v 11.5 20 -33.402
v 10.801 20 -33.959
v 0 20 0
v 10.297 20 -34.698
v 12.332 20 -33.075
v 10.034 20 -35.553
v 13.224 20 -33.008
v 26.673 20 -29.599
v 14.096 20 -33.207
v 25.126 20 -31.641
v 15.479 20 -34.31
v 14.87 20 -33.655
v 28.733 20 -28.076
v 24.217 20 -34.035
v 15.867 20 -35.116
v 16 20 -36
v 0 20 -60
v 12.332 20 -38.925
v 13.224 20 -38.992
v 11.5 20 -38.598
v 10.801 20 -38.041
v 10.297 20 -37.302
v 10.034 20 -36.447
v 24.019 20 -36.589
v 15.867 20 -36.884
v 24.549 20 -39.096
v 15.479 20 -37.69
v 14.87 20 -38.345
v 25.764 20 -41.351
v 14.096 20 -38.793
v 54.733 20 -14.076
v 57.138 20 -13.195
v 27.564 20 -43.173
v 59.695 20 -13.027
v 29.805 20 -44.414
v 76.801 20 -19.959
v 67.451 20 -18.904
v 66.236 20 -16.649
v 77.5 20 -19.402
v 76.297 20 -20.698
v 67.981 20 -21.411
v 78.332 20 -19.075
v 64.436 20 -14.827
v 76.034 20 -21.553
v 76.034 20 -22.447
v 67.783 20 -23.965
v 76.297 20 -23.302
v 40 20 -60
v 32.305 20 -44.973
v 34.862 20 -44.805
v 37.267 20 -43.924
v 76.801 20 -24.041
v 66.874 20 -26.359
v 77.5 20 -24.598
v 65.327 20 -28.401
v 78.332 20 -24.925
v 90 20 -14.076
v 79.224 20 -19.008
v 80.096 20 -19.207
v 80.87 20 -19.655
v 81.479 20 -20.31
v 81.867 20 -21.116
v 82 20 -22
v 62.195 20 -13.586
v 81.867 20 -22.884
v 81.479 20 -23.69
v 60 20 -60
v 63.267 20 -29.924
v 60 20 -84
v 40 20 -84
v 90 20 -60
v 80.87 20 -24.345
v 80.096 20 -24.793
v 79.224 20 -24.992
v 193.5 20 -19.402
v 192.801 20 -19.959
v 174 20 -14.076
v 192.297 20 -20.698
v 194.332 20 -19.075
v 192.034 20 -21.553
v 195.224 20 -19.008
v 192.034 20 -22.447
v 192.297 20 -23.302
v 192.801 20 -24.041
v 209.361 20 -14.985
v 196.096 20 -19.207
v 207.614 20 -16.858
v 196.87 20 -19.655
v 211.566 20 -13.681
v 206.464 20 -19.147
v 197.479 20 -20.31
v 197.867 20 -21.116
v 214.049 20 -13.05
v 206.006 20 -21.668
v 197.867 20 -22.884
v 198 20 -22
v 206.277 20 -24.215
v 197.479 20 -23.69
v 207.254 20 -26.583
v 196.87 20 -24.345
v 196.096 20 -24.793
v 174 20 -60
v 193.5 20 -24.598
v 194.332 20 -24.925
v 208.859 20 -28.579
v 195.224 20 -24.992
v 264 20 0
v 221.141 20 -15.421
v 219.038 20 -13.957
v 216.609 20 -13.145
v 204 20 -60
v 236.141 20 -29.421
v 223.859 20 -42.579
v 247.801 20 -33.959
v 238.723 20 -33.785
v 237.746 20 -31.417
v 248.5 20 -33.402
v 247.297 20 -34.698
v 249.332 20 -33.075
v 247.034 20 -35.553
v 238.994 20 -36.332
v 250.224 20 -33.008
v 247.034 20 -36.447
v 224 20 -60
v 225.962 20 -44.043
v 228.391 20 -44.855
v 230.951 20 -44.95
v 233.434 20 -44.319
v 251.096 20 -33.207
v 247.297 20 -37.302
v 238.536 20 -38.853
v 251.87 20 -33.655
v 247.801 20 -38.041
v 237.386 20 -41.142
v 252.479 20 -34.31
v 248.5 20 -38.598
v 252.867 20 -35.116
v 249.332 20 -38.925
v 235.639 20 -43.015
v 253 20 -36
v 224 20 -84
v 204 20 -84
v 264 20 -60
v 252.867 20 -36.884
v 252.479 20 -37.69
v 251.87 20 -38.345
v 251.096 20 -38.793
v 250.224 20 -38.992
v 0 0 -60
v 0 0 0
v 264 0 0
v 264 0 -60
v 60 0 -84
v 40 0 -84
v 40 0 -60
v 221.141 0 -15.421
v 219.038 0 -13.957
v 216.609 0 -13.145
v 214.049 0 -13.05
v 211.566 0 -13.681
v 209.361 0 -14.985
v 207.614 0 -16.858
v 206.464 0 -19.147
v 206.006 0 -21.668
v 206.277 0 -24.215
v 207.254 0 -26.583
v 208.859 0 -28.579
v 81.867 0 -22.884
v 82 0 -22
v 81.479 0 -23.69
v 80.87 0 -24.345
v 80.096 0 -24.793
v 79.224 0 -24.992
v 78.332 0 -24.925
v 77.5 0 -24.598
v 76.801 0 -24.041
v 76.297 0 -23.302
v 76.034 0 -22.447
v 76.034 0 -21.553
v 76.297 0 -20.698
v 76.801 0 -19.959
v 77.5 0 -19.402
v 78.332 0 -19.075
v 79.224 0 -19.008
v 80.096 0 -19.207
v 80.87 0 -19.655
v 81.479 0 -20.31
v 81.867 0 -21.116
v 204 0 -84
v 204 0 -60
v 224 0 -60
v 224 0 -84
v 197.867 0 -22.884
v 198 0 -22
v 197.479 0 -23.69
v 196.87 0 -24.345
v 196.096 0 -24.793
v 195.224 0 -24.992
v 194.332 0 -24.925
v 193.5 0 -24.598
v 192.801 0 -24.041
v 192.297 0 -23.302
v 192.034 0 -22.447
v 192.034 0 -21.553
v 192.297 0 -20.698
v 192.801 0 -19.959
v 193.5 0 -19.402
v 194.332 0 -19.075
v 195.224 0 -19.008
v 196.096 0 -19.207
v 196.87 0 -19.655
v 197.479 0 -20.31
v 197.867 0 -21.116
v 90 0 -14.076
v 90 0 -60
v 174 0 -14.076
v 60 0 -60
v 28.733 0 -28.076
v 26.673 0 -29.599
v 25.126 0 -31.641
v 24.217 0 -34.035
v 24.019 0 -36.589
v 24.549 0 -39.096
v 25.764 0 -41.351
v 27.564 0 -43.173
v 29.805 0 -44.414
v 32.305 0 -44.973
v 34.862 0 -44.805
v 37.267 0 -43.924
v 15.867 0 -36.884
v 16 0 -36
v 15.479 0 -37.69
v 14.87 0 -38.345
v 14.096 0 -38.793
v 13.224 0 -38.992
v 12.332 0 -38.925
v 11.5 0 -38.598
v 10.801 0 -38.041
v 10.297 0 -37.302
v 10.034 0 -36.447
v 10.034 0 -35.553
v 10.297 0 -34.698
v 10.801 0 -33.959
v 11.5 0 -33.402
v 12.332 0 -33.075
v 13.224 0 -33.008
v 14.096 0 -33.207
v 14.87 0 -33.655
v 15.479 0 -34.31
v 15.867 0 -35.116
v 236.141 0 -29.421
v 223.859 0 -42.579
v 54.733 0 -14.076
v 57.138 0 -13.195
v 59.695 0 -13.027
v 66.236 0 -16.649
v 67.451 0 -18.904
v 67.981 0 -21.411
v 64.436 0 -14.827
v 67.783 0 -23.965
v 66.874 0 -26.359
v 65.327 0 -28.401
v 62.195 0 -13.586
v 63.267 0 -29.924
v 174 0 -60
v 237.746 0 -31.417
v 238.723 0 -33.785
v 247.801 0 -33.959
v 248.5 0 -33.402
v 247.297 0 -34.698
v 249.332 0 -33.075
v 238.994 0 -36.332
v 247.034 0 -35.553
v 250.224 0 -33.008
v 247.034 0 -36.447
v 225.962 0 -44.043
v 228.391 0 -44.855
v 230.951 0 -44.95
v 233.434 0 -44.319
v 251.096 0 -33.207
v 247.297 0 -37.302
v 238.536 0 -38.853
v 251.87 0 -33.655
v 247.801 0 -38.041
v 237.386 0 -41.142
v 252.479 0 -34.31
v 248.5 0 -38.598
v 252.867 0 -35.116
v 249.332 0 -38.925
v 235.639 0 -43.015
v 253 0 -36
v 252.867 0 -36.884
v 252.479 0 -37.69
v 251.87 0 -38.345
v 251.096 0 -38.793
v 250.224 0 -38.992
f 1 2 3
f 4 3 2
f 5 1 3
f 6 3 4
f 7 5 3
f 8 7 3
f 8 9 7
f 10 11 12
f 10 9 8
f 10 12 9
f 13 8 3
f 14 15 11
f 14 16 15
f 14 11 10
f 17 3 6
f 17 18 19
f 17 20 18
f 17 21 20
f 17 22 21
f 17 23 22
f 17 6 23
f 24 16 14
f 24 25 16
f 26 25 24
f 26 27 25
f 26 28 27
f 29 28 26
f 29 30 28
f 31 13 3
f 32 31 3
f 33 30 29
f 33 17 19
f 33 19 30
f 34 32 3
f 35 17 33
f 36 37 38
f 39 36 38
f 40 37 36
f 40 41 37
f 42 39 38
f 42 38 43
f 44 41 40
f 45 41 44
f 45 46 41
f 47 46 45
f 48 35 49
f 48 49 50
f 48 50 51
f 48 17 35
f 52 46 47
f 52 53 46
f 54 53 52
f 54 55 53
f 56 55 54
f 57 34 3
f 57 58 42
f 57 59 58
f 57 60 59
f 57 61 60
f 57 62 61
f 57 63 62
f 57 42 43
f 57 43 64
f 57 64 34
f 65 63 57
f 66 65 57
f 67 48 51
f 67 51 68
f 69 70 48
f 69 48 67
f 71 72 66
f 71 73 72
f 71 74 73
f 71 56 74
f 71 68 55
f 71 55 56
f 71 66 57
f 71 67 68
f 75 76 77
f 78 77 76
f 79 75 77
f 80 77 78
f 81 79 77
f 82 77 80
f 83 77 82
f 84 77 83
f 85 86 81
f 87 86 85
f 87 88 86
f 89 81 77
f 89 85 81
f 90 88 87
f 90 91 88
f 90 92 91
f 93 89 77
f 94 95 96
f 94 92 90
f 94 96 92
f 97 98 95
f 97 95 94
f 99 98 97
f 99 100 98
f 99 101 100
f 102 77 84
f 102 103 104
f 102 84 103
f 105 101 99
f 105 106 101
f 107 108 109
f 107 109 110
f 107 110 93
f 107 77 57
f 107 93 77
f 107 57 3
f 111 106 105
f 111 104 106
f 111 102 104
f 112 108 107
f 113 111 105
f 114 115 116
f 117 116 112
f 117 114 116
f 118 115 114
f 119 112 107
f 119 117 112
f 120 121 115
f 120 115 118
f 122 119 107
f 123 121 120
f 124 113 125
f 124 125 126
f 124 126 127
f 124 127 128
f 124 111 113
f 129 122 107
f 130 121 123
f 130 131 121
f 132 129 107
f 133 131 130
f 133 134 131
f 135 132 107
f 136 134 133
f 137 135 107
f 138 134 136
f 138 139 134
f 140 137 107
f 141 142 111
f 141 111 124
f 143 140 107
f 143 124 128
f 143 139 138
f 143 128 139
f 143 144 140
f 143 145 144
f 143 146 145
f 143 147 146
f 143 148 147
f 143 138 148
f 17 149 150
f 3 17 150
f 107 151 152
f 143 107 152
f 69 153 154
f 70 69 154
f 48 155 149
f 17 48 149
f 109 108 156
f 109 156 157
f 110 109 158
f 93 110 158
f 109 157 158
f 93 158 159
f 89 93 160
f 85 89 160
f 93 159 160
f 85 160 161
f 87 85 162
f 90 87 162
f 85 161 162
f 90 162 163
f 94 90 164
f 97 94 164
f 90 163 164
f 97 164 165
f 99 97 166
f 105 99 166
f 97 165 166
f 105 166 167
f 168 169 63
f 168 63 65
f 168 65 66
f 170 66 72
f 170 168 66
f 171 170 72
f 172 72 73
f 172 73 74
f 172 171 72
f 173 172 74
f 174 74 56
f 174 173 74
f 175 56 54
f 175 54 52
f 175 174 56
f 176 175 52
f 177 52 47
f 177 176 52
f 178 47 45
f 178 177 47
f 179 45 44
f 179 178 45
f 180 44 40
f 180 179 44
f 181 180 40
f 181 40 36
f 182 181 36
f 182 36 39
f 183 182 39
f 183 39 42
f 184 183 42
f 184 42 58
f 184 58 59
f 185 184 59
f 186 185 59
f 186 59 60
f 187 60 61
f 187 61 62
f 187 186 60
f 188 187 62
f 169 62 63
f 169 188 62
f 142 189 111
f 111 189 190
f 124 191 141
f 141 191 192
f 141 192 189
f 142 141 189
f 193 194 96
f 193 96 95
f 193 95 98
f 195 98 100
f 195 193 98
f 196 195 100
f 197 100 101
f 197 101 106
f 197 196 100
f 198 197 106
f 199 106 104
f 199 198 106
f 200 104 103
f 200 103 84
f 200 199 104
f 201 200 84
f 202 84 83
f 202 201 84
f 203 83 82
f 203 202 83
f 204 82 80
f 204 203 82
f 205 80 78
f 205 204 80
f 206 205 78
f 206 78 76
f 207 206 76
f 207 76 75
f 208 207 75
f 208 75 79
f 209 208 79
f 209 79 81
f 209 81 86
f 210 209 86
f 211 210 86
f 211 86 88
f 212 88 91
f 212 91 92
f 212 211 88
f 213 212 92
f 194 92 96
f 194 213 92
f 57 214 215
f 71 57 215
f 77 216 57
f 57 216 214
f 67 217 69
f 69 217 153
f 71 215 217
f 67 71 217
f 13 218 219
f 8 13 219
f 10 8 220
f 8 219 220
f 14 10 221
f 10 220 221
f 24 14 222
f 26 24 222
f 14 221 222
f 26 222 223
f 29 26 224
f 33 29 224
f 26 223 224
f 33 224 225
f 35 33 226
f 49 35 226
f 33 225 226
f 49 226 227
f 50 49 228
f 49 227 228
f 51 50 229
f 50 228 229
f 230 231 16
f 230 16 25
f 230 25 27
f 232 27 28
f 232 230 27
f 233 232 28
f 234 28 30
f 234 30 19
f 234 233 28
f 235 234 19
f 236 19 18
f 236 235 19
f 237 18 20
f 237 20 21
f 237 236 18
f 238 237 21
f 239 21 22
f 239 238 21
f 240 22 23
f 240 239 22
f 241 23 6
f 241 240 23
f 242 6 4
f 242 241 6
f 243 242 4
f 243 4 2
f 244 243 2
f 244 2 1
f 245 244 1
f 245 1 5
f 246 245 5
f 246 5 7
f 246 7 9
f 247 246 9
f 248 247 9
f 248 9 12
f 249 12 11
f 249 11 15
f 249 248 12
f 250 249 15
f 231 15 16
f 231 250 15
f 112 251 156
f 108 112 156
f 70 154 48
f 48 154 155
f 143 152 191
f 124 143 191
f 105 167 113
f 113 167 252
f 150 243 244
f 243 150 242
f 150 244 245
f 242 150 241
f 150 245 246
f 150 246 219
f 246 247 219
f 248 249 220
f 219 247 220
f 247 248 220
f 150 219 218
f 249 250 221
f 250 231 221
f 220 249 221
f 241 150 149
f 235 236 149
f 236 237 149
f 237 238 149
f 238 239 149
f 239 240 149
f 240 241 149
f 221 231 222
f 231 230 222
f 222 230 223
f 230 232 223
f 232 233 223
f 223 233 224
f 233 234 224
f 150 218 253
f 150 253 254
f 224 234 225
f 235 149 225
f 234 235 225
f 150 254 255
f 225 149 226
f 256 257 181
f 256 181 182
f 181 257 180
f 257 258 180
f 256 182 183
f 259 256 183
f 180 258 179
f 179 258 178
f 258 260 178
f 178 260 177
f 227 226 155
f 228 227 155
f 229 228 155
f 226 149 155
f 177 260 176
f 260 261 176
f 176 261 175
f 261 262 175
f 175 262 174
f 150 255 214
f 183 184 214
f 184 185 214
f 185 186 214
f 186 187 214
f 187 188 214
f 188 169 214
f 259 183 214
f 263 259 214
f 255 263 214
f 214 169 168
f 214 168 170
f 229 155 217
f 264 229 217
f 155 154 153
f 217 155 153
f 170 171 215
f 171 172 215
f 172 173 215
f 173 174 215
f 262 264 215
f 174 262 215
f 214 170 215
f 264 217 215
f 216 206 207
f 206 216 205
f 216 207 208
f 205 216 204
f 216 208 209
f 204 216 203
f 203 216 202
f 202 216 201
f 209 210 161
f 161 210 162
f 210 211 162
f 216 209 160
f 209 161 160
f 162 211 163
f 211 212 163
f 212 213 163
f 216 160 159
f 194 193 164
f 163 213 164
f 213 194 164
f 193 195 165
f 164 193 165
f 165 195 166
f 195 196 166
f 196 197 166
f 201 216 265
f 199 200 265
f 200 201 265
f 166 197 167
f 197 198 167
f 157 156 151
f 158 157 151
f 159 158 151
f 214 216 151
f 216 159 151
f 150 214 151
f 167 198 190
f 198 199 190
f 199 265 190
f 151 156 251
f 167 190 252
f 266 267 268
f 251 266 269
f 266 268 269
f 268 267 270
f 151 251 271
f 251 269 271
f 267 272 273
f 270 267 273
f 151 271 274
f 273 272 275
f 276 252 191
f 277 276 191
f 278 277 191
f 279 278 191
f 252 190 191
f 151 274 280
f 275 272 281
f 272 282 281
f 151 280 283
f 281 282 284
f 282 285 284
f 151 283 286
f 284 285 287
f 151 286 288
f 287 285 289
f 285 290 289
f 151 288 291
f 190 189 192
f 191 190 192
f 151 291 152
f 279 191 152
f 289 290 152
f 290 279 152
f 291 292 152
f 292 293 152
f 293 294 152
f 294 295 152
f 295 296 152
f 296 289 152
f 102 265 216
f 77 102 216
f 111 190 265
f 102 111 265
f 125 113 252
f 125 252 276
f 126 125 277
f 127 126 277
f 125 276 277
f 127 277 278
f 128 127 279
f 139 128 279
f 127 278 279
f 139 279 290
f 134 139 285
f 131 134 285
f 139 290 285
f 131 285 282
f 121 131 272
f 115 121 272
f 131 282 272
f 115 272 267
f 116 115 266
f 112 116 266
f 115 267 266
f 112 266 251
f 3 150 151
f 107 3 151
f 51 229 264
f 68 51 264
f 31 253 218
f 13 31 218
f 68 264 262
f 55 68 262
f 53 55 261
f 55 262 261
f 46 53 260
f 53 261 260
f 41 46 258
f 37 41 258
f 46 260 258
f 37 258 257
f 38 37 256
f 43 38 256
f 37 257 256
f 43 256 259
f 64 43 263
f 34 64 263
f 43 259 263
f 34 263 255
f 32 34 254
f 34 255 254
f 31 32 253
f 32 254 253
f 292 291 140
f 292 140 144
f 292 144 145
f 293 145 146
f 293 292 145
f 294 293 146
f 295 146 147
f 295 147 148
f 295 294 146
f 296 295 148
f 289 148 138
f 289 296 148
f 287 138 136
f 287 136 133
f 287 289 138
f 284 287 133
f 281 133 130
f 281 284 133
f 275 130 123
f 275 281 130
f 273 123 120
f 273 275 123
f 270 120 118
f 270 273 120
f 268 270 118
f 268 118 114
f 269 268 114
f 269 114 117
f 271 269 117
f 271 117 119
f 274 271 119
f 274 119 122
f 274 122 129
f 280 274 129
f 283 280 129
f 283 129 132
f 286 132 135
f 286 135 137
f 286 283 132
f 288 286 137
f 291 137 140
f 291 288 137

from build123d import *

# Parameters (mm, degrees)
SKETCH_1_R      = 3
EXTRUDE_1_DEPTH = 20


with BuildPart() as part:
    # 草图1 → 凸台-拉伸1 (new body)
    with BuildSketch(Plane(origin=(0, 0, 0), x_dir=(1, 0, 0), z_dir=(0, 1, 0))):
        Polygon((0, 0), (264, 0), (264, 60), (224, 60), (224, 84), (204, 84), (204, 60), (174, 60), (174, 14.075760101), (90, 14.075760101), (90, 60), (60, 60), (60, 84), (40, 84), (40, 60), (0, 60), align=None)
        with Locations((13, 36)):
            Circle(SKETCH_1_R, mode=Mode.SUBTRACT)
        with Locations((79, 22)):
            Circle(SKETCH_1_R, mode=Mode.SUBTRACT)
        with Locations((195, 22)):
            Circle(SKETCH_1_R, mode=Mode.SUBTRACT)
        with Locations((250, 36)):
            Circle(SKETCH_1_R, mode=Mode.SUBTRACT)
        with BuildLine():
            Line((37.266898407, 43.924239899), (63.266898407, 29.924239899))
            ThreePointArc((63.266898407, 29.924239899), (66.924239899, 17.733101593), (54.733101593, 14.075760101))
            Line((54.733101593, 14.075760101), (28.733101593, 28.075760101))
            ThreePointArc((28.733101593, 28.075760101), (25.075760101, 40.266898407), (37.266898407, 43.924239899))
        make_face(mode=Mode.SUBTRACT)
        with BuildLine():
            Line((208.859135747, 28.579497414), (223.859135747, 42.579497414))
            ThreePointArc((223.859135747, 42.579497414), (236.579497414, 42.140864253), (236.140864253, 29.420502586))
            Line((236.140864253, 29.420502586), (221.140864253, 15.420502586))
            ThreePointArc((221.140864253, 15.420502586), (208.420502586, 15.859135747), (208.859135747, 28.579497414))
        make_face(mode=Mode.SUBTRACT)
    extrude(amount=EXTRUDE_1_DEPTH)


solid = part.part
